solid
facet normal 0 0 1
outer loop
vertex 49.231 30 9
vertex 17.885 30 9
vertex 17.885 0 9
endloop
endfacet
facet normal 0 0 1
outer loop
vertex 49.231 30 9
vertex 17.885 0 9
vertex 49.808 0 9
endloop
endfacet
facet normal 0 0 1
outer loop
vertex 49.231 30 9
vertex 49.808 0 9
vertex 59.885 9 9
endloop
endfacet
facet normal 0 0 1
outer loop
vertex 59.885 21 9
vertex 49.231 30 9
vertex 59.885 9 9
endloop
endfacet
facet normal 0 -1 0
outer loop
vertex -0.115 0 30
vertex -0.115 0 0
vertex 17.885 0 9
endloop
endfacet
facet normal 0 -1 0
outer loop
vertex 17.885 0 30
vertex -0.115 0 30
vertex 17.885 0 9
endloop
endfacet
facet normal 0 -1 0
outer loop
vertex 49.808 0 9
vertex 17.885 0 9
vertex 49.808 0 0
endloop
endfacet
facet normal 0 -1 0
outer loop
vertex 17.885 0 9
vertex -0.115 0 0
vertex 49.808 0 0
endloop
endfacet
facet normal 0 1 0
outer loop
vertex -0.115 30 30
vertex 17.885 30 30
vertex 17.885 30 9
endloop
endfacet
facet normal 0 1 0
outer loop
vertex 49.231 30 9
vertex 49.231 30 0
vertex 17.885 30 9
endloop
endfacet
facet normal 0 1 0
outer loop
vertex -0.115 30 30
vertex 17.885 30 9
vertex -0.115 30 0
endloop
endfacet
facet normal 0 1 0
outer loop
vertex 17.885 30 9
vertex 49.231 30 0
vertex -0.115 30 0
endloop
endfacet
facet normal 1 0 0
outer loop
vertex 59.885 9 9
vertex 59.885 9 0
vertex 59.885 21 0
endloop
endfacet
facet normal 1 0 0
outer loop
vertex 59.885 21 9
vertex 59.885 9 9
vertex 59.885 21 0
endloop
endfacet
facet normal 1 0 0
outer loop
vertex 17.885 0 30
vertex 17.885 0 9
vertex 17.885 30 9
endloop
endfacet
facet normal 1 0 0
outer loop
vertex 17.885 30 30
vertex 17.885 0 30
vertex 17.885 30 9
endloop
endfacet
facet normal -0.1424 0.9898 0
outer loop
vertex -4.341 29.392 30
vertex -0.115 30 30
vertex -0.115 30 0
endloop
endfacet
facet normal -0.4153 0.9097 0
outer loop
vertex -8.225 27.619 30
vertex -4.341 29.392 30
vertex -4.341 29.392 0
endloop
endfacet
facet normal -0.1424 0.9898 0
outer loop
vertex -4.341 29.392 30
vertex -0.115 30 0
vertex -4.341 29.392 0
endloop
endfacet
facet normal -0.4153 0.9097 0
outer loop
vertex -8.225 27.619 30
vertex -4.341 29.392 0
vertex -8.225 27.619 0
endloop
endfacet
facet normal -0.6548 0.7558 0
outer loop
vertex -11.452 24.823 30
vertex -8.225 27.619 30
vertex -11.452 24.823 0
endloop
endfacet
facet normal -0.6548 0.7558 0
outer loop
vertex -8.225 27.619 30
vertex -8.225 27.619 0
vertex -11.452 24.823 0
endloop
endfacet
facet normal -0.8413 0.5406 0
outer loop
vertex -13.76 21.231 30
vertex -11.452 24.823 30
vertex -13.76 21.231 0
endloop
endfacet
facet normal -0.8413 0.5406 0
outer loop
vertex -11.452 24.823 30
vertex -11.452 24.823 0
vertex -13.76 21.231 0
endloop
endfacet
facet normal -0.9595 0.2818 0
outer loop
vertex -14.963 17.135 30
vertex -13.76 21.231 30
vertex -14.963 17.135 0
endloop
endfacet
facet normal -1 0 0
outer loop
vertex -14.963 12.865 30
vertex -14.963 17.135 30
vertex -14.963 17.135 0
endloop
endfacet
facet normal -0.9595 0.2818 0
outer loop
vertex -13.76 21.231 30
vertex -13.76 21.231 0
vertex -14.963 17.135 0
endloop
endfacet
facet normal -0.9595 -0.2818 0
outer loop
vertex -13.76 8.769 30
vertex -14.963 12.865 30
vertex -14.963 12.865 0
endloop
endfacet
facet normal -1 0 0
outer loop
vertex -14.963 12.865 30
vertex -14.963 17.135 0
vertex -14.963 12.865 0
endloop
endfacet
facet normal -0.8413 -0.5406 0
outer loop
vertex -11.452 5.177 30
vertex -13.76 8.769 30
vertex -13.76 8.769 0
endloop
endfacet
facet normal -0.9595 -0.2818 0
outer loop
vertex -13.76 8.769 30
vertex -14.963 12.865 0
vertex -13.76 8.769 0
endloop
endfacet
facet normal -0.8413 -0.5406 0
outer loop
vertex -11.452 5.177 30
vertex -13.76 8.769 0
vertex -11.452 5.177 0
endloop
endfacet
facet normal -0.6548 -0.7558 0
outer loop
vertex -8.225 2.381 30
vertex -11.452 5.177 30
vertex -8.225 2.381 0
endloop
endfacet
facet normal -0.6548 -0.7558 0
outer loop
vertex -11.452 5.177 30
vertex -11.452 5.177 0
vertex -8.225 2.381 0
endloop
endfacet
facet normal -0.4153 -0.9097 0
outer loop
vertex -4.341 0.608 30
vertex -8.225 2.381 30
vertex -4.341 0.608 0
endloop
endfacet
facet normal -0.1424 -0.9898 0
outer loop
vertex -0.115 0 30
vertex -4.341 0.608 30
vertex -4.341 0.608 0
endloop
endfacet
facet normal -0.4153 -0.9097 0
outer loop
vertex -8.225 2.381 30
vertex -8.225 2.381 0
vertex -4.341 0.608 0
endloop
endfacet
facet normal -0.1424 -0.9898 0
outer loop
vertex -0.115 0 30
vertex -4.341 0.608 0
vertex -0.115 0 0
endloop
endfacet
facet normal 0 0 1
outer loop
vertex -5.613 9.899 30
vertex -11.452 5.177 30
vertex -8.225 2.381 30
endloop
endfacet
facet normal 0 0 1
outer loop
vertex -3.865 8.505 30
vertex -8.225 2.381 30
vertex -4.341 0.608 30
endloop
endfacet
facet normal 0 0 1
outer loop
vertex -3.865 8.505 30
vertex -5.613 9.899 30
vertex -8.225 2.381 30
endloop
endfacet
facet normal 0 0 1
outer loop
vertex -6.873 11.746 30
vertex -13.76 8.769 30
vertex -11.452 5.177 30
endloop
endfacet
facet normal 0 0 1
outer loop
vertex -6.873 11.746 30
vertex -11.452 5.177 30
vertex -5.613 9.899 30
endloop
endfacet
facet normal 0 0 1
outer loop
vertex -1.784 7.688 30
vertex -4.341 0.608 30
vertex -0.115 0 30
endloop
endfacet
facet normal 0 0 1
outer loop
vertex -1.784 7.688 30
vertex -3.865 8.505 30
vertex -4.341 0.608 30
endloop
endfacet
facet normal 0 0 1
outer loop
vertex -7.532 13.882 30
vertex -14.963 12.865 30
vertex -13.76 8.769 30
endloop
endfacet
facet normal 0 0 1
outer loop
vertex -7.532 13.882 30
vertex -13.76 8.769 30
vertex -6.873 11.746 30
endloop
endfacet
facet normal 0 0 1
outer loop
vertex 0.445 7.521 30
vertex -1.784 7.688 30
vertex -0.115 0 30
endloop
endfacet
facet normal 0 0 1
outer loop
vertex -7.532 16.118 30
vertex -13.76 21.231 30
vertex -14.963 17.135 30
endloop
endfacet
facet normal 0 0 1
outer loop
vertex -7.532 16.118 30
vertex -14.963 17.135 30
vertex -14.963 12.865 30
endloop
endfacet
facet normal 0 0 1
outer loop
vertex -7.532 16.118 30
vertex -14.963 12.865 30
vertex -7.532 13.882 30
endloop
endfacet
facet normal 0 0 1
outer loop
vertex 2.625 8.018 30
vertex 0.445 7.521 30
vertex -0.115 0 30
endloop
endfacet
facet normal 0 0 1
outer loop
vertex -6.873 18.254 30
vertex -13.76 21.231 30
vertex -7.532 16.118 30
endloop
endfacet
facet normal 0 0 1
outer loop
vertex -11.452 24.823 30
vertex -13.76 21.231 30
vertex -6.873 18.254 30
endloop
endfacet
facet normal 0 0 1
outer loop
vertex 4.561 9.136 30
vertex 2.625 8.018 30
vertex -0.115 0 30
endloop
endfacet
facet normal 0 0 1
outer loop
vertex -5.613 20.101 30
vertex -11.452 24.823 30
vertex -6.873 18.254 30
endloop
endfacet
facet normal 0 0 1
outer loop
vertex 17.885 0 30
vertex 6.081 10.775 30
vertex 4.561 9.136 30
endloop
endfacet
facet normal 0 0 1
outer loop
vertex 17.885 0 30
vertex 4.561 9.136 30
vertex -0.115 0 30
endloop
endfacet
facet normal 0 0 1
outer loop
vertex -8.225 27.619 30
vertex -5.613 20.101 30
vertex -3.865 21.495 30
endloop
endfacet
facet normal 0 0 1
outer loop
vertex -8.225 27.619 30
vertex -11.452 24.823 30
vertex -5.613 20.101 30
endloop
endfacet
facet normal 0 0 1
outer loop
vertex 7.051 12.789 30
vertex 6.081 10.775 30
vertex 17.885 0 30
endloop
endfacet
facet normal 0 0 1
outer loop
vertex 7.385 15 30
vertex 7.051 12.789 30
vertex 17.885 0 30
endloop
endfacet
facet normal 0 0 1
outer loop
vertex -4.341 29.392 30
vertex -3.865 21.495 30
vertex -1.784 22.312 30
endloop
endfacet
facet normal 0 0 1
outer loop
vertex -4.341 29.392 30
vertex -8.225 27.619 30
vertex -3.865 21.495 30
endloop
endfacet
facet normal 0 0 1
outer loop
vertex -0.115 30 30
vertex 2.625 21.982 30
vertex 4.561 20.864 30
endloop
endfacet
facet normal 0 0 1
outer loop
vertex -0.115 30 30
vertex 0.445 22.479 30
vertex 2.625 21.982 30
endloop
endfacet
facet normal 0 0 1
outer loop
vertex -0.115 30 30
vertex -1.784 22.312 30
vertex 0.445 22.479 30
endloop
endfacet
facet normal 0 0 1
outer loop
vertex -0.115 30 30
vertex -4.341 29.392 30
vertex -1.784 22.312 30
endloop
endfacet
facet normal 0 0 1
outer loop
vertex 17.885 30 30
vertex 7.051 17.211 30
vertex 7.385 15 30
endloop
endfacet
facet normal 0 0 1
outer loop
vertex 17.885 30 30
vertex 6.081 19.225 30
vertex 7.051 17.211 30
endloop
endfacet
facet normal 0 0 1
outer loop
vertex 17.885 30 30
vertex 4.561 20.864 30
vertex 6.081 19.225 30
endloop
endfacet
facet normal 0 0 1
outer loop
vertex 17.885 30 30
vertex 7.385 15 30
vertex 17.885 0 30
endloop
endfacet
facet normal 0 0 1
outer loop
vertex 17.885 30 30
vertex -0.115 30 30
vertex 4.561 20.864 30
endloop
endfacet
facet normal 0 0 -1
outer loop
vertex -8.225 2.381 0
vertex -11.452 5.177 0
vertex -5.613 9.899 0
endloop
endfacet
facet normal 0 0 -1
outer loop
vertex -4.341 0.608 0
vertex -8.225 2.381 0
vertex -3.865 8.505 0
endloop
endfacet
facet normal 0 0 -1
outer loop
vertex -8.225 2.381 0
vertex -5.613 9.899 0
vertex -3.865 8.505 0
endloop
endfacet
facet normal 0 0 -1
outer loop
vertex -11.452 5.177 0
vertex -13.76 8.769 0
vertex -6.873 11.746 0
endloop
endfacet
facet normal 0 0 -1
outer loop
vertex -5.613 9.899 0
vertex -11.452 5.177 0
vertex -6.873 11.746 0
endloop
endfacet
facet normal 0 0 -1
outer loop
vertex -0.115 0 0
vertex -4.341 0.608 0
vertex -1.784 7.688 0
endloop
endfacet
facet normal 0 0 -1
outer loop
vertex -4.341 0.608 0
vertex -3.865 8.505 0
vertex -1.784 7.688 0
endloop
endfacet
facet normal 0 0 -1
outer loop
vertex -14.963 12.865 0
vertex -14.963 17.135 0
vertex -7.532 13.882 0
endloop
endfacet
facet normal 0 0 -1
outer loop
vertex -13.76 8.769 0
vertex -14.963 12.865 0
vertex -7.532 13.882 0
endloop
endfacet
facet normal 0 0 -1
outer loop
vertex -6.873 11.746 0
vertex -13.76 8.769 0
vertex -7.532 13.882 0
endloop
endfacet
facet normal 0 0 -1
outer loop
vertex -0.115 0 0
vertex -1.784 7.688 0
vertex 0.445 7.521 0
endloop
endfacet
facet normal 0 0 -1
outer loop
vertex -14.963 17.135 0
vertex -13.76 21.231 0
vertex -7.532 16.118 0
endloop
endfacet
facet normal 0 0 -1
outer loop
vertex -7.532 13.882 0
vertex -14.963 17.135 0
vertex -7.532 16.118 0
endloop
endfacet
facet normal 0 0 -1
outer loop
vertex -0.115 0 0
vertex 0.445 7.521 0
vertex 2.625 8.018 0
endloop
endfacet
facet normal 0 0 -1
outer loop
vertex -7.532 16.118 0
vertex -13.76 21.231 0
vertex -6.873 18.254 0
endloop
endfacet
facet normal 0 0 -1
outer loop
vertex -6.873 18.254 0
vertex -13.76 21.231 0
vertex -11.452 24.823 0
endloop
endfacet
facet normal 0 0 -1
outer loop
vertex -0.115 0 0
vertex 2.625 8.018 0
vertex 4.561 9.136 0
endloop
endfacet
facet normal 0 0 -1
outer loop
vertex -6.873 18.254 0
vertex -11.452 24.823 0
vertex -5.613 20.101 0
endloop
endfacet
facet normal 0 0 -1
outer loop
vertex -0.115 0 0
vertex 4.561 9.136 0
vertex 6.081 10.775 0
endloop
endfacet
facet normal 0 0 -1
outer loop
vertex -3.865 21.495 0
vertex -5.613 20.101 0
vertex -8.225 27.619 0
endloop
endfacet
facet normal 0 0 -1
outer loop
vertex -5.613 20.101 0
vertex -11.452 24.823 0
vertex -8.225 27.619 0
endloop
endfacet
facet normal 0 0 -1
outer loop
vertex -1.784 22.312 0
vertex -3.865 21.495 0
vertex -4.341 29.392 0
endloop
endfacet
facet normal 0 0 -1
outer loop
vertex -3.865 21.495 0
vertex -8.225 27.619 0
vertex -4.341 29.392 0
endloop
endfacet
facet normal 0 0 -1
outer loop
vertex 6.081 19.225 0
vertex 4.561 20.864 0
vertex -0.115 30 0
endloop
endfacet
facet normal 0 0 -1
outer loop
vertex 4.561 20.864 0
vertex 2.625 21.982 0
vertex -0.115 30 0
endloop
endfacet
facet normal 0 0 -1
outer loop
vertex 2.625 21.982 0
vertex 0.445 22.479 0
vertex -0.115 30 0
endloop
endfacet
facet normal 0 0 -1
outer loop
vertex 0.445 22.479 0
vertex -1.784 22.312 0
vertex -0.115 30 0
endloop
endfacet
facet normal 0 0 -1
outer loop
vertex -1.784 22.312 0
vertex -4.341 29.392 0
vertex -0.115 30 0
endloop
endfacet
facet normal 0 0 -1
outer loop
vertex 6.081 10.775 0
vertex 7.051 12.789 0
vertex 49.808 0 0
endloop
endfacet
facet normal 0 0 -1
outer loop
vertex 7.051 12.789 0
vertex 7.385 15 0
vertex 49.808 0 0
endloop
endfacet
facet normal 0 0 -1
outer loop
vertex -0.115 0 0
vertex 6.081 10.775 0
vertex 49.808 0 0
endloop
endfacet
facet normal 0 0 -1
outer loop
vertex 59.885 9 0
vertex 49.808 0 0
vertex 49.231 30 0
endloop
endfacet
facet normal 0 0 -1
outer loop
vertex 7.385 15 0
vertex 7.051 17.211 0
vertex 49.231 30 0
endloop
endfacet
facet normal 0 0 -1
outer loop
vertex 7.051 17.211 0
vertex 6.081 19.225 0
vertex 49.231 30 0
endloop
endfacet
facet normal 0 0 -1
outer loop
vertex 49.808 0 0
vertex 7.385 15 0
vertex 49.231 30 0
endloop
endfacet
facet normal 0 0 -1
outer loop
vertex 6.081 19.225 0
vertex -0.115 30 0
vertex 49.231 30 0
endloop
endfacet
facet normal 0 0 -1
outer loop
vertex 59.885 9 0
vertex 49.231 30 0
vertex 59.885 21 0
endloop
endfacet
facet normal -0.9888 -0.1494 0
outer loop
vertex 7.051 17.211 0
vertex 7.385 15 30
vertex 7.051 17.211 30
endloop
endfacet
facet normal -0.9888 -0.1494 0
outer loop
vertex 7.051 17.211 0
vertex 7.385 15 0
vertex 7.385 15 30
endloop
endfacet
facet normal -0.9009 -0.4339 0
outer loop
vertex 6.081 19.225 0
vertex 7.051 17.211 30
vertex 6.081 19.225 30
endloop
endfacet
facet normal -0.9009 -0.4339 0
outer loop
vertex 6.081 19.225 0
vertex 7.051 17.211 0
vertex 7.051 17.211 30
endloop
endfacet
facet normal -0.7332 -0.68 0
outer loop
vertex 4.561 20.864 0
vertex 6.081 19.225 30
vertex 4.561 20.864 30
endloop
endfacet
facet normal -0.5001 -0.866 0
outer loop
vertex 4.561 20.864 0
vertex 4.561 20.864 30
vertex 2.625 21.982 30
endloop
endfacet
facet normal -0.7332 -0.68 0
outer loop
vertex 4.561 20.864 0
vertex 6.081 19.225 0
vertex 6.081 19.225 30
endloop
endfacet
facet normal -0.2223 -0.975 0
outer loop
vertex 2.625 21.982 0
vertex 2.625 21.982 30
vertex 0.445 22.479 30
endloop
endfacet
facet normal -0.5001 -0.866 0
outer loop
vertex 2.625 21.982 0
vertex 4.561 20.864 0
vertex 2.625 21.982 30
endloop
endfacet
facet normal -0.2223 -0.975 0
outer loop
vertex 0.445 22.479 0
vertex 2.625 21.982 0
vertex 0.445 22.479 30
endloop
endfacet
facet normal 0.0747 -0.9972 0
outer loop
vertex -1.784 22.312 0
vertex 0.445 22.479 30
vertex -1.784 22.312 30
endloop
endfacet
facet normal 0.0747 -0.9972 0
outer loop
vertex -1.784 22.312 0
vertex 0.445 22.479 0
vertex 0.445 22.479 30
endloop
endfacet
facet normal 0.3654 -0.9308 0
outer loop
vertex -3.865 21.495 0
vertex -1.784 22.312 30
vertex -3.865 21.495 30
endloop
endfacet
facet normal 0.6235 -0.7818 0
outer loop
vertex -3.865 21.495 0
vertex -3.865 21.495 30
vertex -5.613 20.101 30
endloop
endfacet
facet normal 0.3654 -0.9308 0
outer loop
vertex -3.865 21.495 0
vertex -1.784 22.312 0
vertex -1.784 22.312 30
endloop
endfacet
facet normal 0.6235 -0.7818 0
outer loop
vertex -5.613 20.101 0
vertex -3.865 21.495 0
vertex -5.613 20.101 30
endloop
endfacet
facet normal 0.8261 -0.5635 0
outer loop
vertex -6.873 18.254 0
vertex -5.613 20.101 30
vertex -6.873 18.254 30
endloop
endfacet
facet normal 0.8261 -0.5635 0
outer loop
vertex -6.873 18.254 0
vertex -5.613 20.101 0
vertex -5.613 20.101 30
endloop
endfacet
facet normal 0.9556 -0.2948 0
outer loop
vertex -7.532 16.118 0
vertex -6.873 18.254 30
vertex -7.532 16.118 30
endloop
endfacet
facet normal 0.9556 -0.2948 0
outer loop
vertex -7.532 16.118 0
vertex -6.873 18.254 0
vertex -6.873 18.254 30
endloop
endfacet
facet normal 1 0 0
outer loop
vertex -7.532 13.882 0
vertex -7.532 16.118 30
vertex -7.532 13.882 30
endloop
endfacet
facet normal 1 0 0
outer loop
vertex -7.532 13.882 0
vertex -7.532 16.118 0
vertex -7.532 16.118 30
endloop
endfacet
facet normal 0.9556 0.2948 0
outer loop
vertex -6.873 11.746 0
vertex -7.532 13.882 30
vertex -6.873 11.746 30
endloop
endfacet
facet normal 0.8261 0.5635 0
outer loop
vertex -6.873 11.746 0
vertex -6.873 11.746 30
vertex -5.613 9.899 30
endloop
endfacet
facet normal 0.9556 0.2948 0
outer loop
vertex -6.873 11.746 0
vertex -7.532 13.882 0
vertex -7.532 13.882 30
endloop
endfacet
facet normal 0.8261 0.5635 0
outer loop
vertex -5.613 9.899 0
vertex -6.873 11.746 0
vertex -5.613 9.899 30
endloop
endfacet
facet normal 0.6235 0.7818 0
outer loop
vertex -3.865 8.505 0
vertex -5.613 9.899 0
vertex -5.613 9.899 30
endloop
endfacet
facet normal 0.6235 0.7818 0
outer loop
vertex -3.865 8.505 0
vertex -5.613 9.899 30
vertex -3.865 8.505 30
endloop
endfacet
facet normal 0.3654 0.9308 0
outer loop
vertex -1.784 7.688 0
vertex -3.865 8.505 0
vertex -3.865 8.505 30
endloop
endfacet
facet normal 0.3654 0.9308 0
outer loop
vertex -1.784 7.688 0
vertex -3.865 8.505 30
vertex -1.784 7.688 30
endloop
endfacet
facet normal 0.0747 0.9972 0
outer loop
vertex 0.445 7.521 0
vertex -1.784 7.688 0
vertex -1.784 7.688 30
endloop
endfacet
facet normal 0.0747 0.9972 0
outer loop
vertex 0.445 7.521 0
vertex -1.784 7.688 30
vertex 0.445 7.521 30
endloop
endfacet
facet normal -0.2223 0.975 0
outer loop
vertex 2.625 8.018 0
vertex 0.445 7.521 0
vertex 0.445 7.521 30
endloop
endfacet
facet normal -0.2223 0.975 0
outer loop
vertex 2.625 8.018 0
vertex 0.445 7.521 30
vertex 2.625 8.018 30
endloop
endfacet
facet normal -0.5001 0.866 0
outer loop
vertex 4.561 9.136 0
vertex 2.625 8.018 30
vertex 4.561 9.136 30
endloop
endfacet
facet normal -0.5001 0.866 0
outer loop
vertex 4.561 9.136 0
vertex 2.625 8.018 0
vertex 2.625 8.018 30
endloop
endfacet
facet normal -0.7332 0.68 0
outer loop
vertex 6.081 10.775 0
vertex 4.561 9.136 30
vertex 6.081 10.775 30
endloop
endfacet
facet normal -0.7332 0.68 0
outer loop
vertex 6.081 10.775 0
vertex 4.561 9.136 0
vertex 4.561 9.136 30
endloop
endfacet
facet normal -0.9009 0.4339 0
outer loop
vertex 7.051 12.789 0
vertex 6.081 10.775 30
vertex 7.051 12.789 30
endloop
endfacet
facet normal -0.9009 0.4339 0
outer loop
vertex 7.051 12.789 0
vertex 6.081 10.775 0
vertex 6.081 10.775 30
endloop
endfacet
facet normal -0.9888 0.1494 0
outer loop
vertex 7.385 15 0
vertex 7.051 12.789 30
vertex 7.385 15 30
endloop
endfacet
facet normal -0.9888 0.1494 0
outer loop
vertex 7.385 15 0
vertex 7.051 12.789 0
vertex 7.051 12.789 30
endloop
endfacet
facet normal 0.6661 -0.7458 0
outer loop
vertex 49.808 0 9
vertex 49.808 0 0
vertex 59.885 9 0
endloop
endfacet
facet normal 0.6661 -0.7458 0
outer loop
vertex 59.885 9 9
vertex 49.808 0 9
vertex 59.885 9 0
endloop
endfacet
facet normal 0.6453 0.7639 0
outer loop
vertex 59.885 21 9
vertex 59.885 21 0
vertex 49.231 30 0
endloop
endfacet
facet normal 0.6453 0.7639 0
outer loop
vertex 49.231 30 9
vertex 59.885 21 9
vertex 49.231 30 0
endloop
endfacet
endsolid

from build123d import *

# Parameters (mm, degrees)
F0_R     = 7.5
F1_DEPTH = 9
F2_R     = 7.5
F3_DEPTH = 21


with BuildPart() as f1:
    # F0 (on Top) → F1 (new body)
    with BuildSketch(Plane.XY):
        with BuildLine():
            Line((-0.11538, 0), (17.88462, 0))
            Line((17.88462, 0), (17.88462, 30))
            Line((17.88462, 30), (-0.11538, 30))
            ThreePointArc((-0.11538, 30), (-15.11538, 15), (-0.11538, 0))
        make_face()
        with Locations((-0.11538, 15)):
            Circle(F0_R, mode=Mode.SUBTRACT)
        Polygon((17.88462, 30), (17.88462, 0), (49.807702, 0), (59.88462, 9), (59.88462, 21), (49.230773, 30), align=None)
    extrude(amount=F1_DEPTH)

    # F2 (on face) → F3 (join)
    with BuildSketch(Plane.XY.offset(9)):
        with BuildLine():
            Line((17.88462, 0), (17.88462, 30))
            Line((17.88462, 30), (-0.11538, 30))
            ThreePointArc((-0.11538, 30), (-15.11538, 15), (-0.11538, 0))
            Line((-0.11538, 0), (17.88462, 0))
        make_face()
        with Locations((-0.11538, 15)):
            Circle(F2_R, mode=Mode.SUBTRACT)
    extrude(amount=F3_DEPTH)


solid = f1.part
